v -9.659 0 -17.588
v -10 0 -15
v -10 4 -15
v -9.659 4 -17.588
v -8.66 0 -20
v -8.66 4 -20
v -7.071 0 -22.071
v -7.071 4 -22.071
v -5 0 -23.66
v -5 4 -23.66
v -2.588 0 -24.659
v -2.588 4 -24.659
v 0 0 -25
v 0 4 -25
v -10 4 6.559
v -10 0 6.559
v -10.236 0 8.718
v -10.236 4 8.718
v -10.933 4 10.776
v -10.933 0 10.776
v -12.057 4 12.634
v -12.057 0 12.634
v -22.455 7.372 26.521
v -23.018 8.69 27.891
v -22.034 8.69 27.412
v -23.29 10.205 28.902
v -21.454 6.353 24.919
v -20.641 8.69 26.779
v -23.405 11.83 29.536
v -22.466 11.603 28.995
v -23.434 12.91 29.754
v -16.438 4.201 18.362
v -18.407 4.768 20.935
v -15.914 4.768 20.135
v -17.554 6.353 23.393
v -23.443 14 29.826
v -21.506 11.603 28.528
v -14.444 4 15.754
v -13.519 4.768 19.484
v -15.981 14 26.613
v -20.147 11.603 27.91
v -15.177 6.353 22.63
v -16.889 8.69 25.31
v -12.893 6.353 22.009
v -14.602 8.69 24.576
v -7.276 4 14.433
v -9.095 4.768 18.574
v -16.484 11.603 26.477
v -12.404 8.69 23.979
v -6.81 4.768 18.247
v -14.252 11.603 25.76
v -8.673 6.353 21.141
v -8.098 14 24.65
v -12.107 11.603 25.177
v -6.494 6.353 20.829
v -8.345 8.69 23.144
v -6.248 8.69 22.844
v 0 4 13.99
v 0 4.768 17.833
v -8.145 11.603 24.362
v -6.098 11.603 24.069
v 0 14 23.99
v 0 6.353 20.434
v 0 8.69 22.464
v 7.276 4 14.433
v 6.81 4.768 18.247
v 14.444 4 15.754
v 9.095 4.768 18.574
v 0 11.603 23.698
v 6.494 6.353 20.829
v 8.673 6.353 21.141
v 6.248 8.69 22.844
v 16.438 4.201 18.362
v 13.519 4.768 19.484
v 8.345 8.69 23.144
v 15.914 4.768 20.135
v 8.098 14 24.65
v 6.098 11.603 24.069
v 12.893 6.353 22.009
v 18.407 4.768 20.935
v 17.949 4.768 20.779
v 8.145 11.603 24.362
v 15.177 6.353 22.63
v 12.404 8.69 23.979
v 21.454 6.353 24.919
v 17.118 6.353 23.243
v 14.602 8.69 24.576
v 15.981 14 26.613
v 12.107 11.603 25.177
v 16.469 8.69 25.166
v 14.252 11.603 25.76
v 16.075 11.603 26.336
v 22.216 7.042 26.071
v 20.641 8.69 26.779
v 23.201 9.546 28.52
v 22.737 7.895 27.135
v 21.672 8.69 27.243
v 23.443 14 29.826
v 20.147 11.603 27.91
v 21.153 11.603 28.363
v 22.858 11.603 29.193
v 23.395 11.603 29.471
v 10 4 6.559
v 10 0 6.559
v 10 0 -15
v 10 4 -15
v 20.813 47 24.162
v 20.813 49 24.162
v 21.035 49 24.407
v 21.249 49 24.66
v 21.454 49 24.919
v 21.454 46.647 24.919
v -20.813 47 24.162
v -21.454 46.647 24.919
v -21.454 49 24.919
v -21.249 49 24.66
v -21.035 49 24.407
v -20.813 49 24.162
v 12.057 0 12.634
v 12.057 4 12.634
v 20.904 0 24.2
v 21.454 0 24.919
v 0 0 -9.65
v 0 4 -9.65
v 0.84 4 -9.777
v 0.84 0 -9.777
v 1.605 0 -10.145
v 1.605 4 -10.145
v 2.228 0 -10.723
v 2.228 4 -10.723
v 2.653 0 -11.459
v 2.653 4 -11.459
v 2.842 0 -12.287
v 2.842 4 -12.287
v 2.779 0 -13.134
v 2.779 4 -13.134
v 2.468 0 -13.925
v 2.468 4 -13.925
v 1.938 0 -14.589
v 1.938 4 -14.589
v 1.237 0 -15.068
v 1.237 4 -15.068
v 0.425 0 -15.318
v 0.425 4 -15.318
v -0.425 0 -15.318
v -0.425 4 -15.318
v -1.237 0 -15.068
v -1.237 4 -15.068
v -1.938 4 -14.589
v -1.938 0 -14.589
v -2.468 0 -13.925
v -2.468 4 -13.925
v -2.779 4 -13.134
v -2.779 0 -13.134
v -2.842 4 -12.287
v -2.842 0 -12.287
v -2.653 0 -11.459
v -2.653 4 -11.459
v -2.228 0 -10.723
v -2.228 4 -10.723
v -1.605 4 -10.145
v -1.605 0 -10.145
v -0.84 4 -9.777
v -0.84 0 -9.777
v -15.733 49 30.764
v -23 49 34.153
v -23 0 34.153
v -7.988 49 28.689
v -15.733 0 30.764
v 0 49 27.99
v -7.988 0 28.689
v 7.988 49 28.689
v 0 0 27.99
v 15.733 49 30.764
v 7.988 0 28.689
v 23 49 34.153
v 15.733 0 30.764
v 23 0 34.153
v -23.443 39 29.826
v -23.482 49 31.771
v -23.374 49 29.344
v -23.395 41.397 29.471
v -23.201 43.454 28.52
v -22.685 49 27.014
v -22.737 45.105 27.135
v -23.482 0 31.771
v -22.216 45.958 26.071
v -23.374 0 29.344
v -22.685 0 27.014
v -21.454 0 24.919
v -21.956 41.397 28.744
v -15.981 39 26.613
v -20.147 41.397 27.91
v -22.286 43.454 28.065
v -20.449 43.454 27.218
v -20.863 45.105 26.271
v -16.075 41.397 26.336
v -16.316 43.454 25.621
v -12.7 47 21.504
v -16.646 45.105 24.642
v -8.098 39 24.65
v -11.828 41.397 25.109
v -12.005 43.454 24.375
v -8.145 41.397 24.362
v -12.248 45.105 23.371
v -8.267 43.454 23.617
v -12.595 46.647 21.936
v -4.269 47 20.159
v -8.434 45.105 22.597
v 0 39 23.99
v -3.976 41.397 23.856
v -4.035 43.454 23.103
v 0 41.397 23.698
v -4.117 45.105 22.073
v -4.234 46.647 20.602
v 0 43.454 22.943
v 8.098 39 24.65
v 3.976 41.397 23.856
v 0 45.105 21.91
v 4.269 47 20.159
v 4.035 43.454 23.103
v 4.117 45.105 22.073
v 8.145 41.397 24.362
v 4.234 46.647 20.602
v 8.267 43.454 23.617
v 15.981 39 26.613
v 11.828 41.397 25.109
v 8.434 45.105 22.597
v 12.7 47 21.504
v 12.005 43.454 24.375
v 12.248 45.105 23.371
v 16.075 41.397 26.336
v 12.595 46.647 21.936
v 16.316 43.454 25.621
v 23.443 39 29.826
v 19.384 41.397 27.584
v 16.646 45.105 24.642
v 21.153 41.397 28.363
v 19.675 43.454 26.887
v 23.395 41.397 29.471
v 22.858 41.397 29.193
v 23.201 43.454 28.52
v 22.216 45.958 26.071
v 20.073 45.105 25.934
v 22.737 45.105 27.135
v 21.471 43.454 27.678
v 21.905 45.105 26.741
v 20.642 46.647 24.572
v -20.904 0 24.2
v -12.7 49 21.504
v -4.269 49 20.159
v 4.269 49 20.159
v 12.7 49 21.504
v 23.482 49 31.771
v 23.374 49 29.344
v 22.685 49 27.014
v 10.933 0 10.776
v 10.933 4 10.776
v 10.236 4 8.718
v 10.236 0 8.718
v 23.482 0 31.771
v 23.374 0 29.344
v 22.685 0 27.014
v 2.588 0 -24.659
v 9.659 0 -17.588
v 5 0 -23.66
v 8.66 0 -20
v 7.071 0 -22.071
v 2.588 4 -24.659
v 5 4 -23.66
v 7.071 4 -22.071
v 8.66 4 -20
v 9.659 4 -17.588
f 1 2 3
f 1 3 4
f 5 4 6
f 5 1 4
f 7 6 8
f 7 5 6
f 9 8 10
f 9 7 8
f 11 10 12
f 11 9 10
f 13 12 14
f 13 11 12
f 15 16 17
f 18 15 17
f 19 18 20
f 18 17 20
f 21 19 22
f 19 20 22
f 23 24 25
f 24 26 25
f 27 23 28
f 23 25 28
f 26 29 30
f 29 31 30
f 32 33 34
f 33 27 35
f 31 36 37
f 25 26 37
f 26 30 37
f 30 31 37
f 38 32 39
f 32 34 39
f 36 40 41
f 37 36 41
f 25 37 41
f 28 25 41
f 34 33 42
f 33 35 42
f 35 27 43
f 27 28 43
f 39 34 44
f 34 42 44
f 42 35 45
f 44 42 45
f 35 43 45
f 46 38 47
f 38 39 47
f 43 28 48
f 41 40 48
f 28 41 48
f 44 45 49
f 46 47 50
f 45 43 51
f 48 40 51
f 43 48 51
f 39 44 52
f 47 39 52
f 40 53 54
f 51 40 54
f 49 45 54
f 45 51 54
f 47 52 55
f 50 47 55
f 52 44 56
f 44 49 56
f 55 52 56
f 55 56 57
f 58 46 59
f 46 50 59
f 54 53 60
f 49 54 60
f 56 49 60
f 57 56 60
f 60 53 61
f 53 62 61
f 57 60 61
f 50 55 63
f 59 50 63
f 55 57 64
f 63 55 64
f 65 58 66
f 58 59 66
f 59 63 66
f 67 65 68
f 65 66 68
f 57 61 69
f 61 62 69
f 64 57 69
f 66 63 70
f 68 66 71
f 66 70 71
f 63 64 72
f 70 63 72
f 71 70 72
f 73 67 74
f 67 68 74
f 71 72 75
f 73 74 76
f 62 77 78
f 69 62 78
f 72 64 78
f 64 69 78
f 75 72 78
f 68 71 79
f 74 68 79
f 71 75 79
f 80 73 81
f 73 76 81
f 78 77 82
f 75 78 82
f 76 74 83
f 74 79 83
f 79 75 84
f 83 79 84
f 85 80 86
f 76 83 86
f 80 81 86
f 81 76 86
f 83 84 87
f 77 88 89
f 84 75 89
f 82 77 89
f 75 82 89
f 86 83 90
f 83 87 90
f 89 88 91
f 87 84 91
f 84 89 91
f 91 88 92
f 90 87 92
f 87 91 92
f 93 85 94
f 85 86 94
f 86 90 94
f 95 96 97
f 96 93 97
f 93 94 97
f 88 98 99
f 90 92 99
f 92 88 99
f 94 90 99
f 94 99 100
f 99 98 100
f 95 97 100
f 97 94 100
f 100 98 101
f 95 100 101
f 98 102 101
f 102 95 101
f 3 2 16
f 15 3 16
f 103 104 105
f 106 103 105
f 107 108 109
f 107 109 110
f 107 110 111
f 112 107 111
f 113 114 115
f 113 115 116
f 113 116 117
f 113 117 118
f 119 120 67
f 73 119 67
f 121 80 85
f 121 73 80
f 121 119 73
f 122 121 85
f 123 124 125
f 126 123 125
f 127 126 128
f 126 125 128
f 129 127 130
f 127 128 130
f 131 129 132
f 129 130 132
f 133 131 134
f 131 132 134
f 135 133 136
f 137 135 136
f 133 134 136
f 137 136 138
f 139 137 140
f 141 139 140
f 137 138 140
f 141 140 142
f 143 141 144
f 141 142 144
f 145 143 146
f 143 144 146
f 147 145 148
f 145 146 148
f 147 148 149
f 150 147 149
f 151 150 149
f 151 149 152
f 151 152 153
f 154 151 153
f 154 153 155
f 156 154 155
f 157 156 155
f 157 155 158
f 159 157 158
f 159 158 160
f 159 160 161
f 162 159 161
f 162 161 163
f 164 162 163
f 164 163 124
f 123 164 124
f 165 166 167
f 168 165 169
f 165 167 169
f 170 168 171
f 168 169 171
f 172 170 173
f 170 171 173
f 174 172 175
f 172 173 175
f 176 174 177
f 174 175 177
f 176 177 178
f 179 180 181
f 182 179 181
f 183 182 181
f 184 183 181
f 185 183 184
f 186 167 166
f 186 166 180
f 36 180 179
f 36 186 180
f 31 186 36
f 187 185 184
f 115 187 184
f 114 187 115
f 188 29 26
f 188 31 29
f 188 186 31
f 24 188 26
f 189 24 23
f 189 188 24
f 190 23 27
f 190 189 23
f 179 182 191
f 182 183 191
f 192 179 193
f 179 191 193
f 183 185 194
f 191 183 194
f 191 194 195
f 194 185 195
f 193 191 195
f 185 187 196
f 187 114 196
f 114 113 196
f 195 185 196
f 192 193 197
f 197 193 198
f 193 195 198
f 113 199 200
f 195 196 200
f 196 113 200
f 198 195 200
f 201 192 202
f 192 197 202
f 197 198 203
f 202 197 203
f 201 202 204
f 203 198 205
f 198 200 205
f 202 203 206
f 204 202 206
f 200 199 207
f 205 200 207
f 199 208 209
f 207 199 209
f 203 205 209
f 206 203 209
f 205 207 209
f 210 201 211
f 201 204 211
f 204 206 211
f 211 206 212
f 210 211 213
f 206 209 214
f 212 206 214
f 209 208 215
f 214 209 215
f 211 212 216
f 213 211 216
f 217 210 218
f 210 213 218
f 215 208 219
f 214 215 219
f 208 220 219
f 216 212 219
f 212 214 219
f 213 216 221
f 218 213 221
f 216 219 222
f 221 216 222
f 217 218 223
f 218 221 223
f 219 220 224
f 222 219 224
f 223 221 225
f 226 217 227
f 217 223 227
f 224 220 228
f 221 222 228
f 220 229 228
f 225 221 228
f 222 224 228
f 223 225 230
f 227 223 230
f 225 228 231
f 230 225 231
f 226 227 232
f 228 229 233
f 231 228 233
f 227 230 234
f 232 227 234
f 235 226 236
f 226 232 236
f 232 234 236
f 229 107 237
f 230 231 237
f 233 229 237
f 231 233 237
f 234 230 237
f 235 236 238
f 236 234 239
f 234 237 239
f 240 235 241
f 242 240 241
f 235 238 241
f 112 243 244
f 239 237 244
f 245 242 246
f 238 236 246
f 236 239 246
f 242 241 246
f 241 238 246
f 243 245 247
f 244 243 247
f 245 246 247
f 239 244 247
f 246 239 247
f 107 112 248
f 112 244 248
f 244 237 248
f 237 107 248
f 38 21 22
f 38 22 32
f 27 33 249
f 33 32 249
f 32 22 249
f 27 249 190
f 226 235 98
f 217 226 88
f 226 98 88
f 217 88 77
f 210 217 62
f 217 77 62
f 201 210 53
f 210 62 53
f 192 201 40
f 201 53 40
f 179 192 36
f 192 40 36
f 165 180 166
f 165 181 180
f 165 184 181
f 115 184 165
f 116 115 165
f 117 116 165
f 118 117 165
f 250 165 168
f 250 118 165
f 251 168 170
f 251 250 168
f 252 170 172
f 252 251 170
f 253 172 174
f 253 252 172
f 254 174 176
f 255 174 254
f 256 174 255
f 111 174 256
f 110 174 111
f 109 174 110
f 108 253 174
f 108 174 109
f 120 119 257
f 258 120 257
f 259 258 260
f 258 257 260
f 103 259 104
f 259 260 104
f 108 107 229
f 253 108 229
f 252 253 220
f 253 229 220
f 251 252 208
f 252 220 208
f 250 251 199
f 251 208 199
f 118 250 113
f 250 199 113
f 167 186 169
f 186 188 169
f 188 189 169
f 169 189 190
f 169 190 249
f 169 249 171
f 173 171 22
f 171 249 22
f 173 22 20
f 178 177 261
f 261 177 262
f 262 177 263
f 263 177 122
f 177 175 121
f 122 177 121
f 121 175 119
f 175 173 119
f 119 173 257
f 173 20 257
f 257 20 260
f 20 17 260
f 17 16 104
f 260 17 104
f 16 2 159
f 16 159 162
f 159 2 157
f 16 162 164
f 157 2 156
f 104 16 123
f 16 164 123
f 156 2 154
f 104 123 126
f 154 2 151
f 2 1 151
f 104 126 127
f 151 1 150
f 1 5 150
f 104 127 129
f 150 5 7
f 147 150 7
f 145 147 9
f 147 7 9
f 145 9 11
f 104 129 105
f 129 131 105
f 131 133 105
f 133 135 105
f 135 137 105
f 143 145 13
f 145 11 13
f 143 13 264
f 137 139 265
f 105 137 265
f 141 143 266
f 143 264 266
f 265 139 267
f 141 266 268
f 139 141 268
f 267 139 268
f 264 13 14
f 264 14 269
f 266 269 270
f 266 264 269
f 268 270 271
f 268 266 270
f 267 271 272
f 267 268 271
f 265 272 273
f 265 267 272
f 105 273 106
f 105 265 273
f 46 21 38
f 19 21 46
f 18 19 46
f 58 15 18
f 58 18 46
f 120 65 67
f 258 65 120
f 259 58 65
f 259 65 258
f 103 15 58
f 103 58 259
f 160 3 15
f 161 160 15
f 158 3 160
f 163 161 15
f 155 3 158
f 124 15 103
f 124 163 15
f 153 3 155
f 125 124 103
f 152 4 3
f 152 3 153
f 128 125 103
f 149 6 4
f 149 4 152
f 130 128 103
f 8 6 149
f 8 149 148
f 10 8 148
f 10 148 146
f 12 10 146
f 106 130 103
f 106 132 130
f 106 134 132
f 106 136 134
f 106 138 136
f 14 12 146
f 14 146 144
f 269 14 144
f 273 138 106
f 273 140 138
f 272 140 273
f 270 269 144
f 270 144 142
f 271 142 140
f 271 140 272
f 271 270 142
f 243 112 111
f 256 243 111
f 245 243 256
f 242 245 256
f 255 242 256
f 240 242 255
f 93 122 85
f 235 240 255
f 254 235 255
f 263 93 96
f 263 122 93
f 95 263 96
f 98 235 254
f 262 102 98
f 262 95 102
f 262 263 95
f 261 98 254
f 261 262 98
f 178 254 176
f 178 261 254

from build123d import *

# Parameters (mm, degrees)
EXTRUDE_1_DEPTH     = 4
SKETCH_2_R          = 2.85
CUT_EXTRUDE_1_DEPTH = 10.000000000000002
EXTRUDE_2_DEPTH     = 45
FILLET_1_R          = 10
EXTRUDE_START       = -2
EXTRUDE_3_DEPTH     = 2
FILLET_2_R          = 10
FILLET_3_DEPTH      = 50
FILLET_START        = 44.37538
FILLET_3_2_DEPTH    = 5.62462
FILLET_3_3_DEPTH    = 4


with BuildPart() as part:
    # 草图1 → 凸台-拉伸1 (new body)
    with BuildSketch(Plane(origin=(0, 0, 0), x_dir=(1, 0, 0), z_dir=(0, 1, 0))):
        with BuildLine():
            ThreePointArc((-10, -25), (5.66e-15, -23.98979485566356), (10.000000000000009, -25))
            Line((10.000000000000002, -25.000000000000007), (9.999999999999996, 24.999999999999993))
            Line((9.999999999999996, 24.999999999999993), (-10.000000000000004, 24.999999999999993))
            Line((-10.000000000000004, 24.999999999999993), (-9.999999999999996, -25.000000000000007))
        make_face()
        with BuildLine():
            ThreePointArc((-23.00000000000064, -34.15262628157976), (5.42e-15, -27.98979485566356), (23.000000000000654, -34.15262628157976))
            Line((23.000000000000064, -34.15262628157941), (25.00000000000006, -30.688524666441673))
            ThreePointArc((25.000000000000064, -30.688524666441666), (17.729631361654985, -27.23875024936818), (10.000000000000009, -25))
            Line((10.000000000000004, -25.000000000000007), (-9.999999999999996, -25.000000000000007))
            ThreePointArc((-10, -25), (-17.72963136165498, -27.23875024936818), (-25.000000000000064, -30.688524666441673))
            Line((-25.00000000000006, -30.688524666441673), (-23.000000000000057, -34.152626281579415))
        make_face()
        with BuildLine():
            Line((-9.999999999999996, -25.000000000000007), (10.000000000000004, -25.000000000000007))
            ThreePointArc((10.000000000000009, -25), (5.66e-15, -23.98979485566356), (-10, -25))
        make_face()
    extrude(amount=EXTRUDE_1_DEPTH)

    # 草图2 → 切除-拉伸1 (cut)
    with BuildSketch(Plane(origin=(0, 4, 0), x_dir=(1, 0, 0), z_dir=(0, 1, 0))):
        with Locations(Location((-1.73e-15, 12.499999999999996, 0), (0, 0, 270))):
            Circle(SKETCH_2_R)
    extrude(amount=-CUT_EXTRUDE_1_DEPTH, mode=Mode.SUBTRACT)

    # 草图3 → 凸台-拉伸2 (add)
    with BuildSketch(Plane(origin=(0, 4, 0), x_dir=(1, 0, 0), z_dir=(0, 1, 0))):
        with BuildLine():
            ThreePointArc((9.999999999999995, -25.000000000000007), (5.66e-15, -23.989794855663575), (-9.999999999999996, -25.000000000000014))
            ThreePointArc((-9.999999999999996, -25.000000000000014), (-17.729631361654977, -27.238750249368195), (-25.000000000000057, -30.68852466644168))
            Line((-25.000000000000064, -30.68852466644167), (-23.00000000000006, -34.152626281579415))
            ThreePointArc((-23.000000000000064, -34.152626281579415), (-5.33e-15, -27.98979485566356), (23.000000000000064, -34.15262628157941))
            Line((23.000000000000057, -34.152626281579415), (25.00000000000006, -30.688524666441673))
            ThreePointArc((25.000000000000057, -30.68852466644168), (17.72963136165498, -27.238750249368195), (9.999999999999995, -25.000000000000007))
        make_face()
    extrude(amount=EXTRUDE_2_DEPTH)

    # 倒角1
    # the kernel refuses this chamfer: 25.647736894, 20 mm, written as the material it adds along each edge
    with BuildSketch(Plane(origin=(10.000000000000004, 0, 25.00000000000001), x_dir=(-2.4e-16, 0, -1), z_dir=(0, 1, 0))) as chamfer_1_piece_1_section:
        with BuildLine():
            Line((15.870240384772439, 0.6233017511174166), (-7.473452483423025, -17.23288480714665))
            Line((-7.473452483423025, -17.23288480714665), (-7.907732226484158, -16.959894573117097))
            ThreePointArc((-7.907732226484158, -16.959894573117097), (-3.2240953608677487, -8.827331157857245), (-0.5025909475750687, 0.10259094757506672))
            Line((-0.5025909475750687, 0.10259094757506672), (1.2e-16, 0.5129547378753365))
            ThreePointArc((1.2e-16, 0.5129547378753365), (7.9351201923862185, 0.5129547378753364), (15.870240384772439, 1.136256488992753))
            Line((15.870240384772439, 1.136256488992753), (15.870240384772439, 0.6233017511174166))
        make_face()
    chamfer_1_piece_1 = extrude(amount=4, mode=Mode.PRIVATE)
    chamfer_1_piece_1 = split(chamfer_1_piece_1, bisect_by=Plane(origin=(23.713203435596473, 0, 32.91732169499376), z_dir=(-0.8660254037844379, 0, -0.5000000000000014)), keep=Keep.TOP, mode=Mode.PRIVATE)
    add(chamfer_1_piece_1)
    with BuildSketch(Plane(origin=(-9.999999999999996, 0, 25.000000000000007), x_dir=(-1.2e-16, 0, -1), z_dir=(0, 1, 0))) as chamfer_1_piece_2_section:
        with BuildLine():
            Line((15.8702403847722, -0.6233017511174258), (-7.473452483423406, 17.232884807146757))
            Line((-7.473452483423406, 17.232884807146757), (-7.907732226484546, 16.959894573117197))
            ThreePointArc((-7.907732226484546, 16.959894573117197), (-3.224095360867959, 8.827331157857294), (-0.5025909475750723, -0.10259094757507187))
            Line((-0.5025909475750723, -0.10259094757507187), (-6e-17, -0.5129547378753436))
            ThreePointArc((-6e-17, -0.5129547378753436), (7.935120192386101, -0.5129547378753427), (15.8702403847722, -1.1362564889927693))
            Line((15.8702403847722, -1.1362564889927693), (15.8702403847722, -0.6233017511174258))
        make_face()
    chamfer_1_piece_2 = extrude(amount=4, mode=Mode.PRIVATE)
    chamfer_1_piece_2 = split(chamfer_1_piece_2, bisect_by=Plane(origin=(-23.713203435596462, 0, 32.917321694993774), z_dir=(0.8660254037844375, 0, -0.500000000000002)), keep=Keep.TOP, mode=Mode.PRIVATE)
    add(chamfer_1_piece_2)

    # 圆角1
    fillet_1_edges = [part.edges().sort_by_distance(p)[0] for p in [
        (3.375e-14, 4, 23.989794855663604),
    ]]
    fillet(fillet_1_edges, radius=FILLET_1_R)

    # 草图4 → 凸台-拉伸3 (add)
    with BuildSketch(Plane(origin=(0, 49, 0), x_dir=(1, 0, 0), z_dir=(0, 1, 0)).offset(EXTRUDE_START)):
        with BuildLine():
            Line((-27.00000000000007, -27.22442305130391), (-25.00000000000007, -30.68852466644167))
            ThreePointArc((-25.00000000000007, -30.68852466644167), (5.66e-15, -23.98979485566357), (25.00000000000006, -30.688524666441673))
            Line((25.00000000000006, -30.688524666441673), (27.00000000000007, -27.22442305130391))
            ThreePointArc((27.00000000000007, -27.22442305130391), (5.91e-15, -19.989794855663554), (-27.00000000000007, -27.22442305130391))
        make_face()
    extrude(amount=EXTRUDE_3_DEPTH)

    # 圆角2
    # the kernel refuses this fillet: 10 mm, written as the material it adds along each edge
    with BuildSketch(Plane(origin=(-7.11e-15, 47, 73.9897948556636), x_dir=(-0.5000000000000009, 0, -0.8660254037844382), z_dir=(-0.8660254037844382, 0, 0.5000000000000009))) as fillet_2_piece_1:
        with BuildLine():
            CenterArc((60.000000000000014, 8.000000000000028), FILLET_2_R, 180, 53.13010235415629)
            Line((50.00000000000002, 8.000000000000028), (49.80000000000001, 8.000000000000028))
            Line((49.80000000000001, 8.000000000000028), (49.80000000000004, 0))
            Line((49.80000000000004, 0), (50.000000000000036, -0.20000000000000284))
            ThreePointArc((50.000000000000036, -0.20000000000000284), (52.000000000000036, -0.20000000000000284), (53.88000000000005, -0.1600000000000037))
            Line((53.88000000000005, -0.1600000000000037), (54.00000000000006, 0))
        make_face()
    revolve(axis=Axis((-7.11e-15, 47, 73.9897948556636), (0, -1, 0)), revolution_arc=60.000000000000135)

    # 圆角3: read off the stored shape, not the designer's step
    # 圆角3 outline → 圆角3 (cut)
    with BuildSketch(Plane(origin=(0, 0, 0), x_dir=(1, 0, 0), z_dir=(0, 1, 0))):
        with BuildLine():
            ThreePointArc((-23, -34.152626282), (-23.374473484, -29.343864194), (-21.454427524, -24.919178135))
            Line((-21.454427524, -24.919178135), (-20.904466424, -24.200204744))
            ThreePointArc((-20.904466424, -24.200204744), (-23.999915623, -25.616206503), (-27, -27.224423051))
            Line((-27, -27.224423051), (-23, -34.152626282))
        make_face()
        with BuildLine():
            Line((23, -34.152626282), (27, -27.224423051))
            ThreePointArc((27, -27.224423051), (23.999915623, -25.616206503), (20.904466424, -24.200204744))
            Line((20.904466424, -24.200204744), (21.454427366, -24.919177929))
            ThreePointArc((21.454427366, -24.919177929), (23.374473462, -29.343864066), (23, -34.152626282))
        make_face()
        with BuildLine():
            Line((-10, 25), (-10, 15))
            ThreePointArc((-10, 15), (-7.071067812, 22.071067812), (0, 25))
            Line((0, 25), (-10, 25))
        make_face()
        with BuildLine():
            Line((10, 25), (0, 25))
            ThreePointArc((0, 25), (7.071067812, 22.071067812), (10, 15))
            Line((10, 15), (10, 25))
        make_face()
    extrude(amount=FILLET_3_DEPTH, mode=Mode.SUBTRACT)

    # Fillet 3 2 outline → Fillet 3 2 (cut)
    with BuildSketch(Plane(origin=(0, 0, 0), x_dir=(1, 0, 0), z_dir=(0, 1, 0)).offset(FILLET_START)):
        with BuildLine():
            Line((-20.904466424, -24.200204744), (-21.454427524, -24.919178135))
            ThreePointArc((-21.454427524, -24.919178135), (-21.143258439, -24.532645684), (-20.813297877, -24.162025174))
            ThreePointArc((-20.813297877, -24.162025174), (-20.858890886, -24.1810941), (-20.904466424, -24.200204744))
        make_face()
        with BuildLine():
            ThreePointArc((20.904466424, -24.200204744), (20.858890886, -24.1810941), (20.813297877, -24.162025174))
            ThreePointArc((20.813297877, -24.162025174), (21.143258356, -24.532645585), (21.454427366, -24.919177929))
            Line((21.454427366, -24.919177929), (20.904466424, -24.200204744))
        make_face()
    extrude(amount=FILLET_3_2_DEPTH, mode=Mode.SUBTRACT)

    # Fillet 3 3 outline → Fillet 3 3 (add)
    with BuildSketch(Plane(origin=(0, 0, 0), x_dir=(1, 0, 0), z_dir=(0, 1, 0))):
        with BuildLine():
            ThreePointArc((-10, -6.558505859), (-10.528269314, -9.765734851), (-12.057263561, -12.634107711))
            Line((-12.057263561, -12.634107711), (-10, -9.944612473))
            Line((-10, -9.944612473), (-10, -6.558505859))
        make_face()
        with BuildLine():
            Line((10, -9.944612473), (12.057263561, -12.634107711))
            ThreePointArc((12.057263561, -12.634107711), (10.528269314, -9.765734851), (10, -6.558505859))
            Line((10, -6.558505859), (10, -9.944612473))
        make_face()
    extrude(amount=FILLET_3_3_DEPTH)


solid = part.part
